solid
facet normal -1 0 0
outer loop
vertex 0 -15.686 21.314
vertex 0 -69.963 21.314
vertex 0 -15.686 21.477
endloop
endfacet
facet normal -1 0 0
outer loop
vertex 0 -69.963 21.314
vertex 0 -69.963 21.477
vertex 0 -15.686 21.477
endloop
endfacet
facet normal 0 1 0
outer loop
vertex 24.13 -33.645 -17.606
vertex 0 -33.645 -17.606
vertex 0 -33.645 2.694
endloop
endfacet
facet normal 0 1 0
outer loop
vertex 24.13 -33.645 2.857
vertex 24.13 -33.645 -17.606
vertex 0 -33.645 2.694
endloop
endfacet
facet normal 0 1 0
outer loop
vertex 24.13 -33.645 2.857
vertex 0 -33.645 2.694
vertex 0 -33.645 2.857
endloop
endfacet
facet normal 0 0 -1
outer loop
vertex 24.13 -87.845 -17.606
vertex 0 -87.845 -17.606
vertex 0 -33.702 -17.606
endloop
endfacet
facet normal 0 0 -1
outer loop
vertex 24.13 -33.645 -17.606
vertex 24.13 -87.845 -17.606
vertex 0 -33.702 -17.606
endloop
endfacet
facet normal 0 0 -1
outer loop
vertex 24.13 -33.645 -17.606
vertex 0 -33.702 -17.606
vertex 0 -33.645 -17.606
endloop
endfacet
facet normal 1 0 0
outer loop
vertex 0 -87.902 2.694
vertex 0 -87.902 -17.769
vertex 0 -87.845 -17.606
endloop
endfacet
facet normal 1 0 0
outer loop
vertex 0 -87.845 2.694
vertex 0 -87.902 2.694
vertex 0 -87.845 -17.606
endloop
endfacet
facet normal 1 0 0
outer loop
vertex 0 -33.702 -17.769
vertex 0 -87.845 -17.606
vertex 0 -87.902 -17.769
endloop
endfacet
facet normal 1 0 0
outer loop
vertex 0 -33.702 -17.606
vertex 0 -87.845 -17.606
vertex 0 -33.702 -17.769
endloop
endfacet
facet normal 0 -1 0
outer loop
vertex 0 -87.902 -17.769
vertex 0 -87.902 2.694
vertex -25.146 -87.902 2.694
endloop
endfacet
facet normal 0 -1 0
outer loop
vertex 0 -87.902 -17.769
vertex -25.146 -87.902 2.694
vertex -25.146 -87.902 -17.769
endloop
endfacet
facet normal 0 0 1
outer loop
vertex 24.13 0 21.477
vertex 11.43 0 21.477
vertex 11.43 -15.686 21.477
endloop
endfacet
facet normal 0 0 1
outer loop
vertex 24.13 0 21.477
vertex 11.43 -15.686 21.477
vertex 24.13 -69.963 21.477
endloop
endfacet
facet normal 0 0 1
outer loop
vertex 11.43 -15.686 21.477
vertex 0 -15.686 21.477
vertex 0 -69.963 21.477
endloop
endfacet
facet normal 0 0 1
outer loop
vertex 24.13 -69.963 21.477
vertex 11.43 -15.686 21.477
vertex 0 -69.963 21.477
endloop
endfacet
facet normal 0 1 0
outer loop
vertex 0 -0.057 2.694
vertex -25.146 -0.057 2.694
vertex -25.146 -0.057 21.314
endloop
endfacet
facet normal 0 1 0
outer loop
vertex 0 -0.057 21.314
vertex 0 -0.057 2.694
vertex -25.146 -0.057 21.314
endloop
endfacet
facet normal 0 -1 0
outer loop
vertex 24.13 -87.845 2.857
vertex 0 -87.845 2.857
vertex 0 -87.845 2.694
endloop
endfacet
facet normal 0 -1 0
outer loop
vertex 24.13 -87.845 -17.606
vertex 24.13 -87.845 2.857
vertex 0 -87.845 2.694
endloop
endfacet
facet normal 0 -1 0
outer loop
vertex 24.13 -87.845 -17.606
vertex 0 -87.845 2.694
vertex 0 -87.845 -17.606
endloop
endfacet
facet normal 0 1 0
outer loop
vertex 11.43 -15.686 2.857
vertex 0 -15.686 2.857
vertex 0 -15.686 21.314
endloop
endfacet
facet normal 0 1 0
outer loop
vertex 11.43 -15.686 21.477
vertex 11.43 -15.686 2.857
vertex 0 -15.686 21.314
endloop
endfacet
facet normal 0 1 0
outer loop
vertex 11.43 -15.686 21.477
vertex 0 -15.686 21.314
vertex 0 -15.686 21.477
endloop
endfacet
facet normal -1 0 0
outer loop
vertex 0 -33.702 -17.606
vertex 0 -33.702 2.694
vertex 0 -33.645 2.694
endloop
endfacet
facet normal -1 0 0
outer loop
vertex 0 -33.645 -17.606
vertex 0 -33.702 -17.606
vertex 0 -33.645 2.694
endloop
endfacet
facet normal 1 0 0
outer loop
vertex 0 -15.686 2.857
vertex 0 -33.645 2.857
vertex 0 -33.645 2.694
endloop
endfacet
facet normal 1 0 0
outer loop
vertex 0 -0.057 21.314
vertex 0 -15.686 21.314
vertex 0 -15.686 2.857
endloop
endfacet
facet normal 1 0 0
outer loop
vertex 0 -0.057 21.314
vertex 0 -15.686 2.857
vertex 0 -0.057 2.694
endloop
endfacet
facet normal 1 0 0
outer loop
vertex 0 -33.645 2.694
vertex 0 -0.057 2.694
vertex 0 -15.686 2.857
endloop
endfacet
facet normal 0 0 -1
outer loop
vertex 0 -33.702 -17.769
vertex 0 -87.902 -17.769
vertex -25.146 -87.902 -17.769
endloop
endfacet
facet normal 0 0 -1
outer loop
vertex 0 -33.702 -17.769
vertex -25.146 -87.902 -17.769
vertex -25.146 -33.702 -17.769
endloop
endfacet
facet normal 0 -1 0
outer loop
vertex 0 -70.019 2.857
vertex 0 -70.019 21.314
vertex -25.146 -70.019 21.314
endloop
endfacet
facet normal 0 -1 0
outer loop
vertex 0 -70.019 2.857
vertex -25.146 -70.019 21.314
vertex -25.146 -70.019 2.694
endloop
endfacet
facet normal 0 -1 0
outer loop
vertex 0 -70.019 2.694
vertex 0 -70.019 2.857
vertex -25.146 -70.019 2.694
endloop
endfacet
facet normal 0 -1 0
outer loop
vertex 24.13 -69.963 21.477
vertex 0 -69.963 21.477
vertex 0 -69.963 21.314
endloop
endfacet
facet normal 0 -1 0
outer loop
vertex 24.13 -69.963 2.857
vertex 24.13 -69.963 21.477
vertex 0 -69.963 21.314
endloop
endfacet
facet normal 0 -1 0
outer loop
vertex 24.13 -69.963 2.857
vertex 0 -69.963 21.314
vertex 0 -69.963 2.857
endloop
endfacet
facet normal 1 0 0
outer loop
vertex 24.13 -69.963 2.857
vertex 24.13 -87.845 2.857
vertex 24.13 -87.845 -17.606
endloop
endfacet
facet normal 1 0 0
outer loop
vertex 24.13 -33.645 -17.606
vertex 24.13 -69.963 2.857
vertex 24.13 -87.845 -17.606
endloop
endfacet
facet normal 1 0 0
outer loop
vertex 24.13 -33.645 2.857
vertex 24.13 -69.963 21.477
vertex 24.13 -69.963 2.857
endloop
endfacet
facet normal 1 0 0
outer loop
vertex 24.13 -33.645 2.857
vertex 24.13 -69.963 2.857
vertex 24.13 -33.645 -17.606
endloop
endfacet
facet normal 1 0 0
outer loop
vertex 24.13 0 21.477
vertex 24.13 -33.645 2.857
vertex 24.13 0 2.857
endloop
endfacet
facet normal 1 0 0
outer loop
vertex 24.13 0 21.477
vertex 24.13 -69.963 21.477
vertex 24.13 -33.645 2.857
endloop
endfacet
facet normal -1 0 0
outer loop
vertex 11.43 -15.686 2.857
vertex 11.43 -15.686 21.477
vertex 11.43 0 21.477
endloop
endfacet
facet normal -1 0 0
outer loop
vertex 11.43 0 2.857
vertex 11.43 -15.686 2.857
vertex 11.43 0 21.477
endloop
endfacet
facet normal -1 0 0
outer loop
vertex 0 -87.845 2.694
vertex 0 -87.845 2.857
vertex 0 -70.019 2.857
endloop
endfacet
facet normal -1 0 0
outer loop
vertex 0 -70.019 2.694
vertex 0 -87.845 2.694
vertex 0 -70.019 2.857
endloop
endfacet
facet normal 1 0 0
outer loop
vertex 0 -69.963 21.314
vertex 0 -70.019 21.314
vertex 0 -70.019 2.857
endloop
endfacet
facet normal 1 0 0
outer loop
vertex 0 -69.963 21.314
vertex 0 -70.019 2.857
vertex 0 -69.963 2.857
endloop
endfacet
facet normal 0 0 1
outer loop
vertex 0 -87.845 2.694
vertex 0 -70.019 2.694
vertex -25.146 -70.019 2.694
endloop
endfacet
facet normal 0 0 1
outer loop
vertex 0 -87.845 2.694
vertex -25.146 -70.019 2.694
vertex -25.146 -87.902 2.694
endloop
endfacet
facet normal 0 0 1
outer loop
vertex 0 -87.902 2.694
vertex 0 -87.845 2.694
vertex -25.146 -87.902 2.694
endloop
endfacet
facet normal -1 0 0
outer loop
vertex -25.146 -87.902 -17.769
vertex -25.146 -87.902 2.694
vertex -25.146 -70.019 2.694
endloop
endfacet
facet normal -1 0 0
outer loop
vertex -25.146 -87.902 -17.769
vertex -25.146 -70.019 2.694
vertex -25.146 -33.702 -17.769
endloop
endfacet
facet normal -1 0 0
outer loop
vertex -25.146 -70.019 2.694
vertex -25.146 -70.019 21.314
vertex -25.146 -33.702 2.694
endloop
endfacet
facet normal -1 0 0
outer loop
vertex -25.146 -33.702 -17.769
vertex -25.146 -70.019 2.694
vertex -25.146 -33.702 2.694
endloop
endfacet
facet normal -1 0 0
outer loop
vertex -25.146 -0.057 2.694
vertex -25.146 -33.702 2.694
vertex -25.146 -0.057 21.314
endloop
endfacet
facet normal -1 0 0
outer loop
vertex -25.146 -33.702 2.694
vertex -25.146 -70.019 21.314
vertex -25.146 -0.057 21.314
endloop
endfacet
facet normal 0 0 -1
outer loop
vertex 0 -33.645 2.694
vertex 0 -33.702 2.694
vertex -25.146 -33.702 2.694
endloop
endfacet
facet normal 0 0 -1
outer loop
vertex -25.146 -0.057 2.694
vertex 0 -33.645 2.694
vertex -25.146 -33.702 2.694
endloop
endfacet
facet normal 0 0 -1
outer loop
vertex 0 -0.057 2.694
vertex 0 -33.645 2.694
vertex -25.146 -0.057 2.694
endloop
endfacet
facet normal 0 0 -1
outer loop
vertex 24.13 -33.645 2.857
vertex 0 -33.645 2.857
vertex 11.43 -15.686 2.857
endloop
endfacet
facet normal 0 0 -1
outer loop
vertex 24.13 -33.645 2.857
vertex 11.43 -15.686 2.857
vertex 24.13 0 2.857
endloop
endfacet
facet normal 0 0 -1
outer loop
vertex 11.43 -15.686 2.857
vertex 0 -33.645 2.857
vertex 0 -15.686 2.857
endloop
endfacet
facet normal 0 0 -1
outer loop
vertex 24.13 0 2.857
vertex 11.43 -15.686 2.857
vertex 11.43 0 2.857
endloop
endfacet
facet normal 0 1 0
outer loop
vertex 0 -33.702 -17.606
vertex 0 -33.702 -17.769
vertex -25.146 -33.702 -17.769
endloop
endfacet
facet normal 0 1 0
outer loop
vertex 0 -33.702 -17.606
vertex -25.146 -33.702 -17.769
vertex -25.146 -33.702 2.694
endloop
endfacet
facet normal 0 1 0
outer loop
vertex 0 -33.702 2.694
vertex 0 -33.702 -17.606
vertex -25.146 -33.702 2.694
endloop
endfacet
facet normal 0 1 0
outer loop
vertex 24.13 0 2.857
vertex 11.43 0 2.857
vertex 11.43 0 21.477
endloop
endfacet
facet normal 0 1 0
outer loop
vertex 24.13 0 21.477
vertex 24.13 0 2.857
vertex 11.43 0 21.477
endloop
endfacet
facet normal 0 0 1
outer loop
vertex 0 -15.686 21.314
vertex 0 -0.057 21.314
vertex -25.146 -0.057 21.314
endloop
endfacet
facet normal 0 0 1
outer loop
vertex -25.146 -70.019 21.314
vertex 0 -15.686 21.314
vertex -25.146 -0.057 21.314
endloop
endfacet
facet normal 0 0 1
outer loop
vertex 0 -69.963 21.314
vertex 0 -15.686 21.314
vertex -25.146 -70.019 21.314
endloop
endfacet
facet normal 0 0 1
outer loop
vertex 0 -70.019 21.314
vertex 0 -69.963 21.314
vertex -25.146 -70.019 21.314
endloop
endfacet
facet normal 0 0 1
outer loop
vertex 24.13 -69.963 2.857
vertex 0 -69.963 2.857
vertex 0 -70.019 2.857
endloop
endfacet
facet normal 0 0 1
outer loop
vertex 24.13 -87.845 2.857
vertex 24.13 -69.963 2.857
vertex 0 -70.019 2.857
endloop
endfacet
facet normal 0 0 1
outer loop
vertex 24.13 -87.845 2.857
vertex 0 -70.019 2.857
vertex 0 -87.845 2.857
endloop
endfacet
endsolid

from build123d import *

# Parameters (mm, degrees)
F1_DEPTH = 24.13
F2_W     = 15.685529
F2_H     = 20.463388
F3_DEPTH = 11.43
F5_DEPTH = 25.146


with BuildPart() as f1:
    # F0 (on Right) → F1 (new body)
    with BuildSketch(Plane.YZ):
        Polygon((0, 21.47734), (-69.962664, 21.47734), (-69.962664, 2.857499), (-33.644756, 2.857499), (0, 2.857499), align=None)
        Polygon((-33.644756, 2.857499), (-69.962664, 2.857499), (-87.845083, 2.857499), (-87.845083, -17.605888), (-33.644756, -17.605888), align=None)
    extrude(amount=F1_DEPTH)

    # F2 (on Right) → F3 (cut)
    with BuildSketch(Plane.YZ):
        with Locations((-7.842764, 12.16742)):
            Rectangle(F2_W, F2_H)
    extrude(amount=F3_DEPTH, mode=Mode.SUBTRACT)

    # F4 (on Right) → F5 (join)
    with BuildSketch(Plane.YZ):
        Polygon((-0.056833, 21.314132), (-70.019497, 21.314132), (-70.019497, 2.694292), (-33.701589, 2.694292), (-0.056833, 2.694292), align=None)
        Polygon((-33.701589, 2.694292), (-70.019497, 2.694292), (-87.901916, 2.694292), (-87.901916, -17.769095), (-33.701589, -17.769095), align=None)
    extrude(amount=-F5_DEPTH)


solid = f1.part
